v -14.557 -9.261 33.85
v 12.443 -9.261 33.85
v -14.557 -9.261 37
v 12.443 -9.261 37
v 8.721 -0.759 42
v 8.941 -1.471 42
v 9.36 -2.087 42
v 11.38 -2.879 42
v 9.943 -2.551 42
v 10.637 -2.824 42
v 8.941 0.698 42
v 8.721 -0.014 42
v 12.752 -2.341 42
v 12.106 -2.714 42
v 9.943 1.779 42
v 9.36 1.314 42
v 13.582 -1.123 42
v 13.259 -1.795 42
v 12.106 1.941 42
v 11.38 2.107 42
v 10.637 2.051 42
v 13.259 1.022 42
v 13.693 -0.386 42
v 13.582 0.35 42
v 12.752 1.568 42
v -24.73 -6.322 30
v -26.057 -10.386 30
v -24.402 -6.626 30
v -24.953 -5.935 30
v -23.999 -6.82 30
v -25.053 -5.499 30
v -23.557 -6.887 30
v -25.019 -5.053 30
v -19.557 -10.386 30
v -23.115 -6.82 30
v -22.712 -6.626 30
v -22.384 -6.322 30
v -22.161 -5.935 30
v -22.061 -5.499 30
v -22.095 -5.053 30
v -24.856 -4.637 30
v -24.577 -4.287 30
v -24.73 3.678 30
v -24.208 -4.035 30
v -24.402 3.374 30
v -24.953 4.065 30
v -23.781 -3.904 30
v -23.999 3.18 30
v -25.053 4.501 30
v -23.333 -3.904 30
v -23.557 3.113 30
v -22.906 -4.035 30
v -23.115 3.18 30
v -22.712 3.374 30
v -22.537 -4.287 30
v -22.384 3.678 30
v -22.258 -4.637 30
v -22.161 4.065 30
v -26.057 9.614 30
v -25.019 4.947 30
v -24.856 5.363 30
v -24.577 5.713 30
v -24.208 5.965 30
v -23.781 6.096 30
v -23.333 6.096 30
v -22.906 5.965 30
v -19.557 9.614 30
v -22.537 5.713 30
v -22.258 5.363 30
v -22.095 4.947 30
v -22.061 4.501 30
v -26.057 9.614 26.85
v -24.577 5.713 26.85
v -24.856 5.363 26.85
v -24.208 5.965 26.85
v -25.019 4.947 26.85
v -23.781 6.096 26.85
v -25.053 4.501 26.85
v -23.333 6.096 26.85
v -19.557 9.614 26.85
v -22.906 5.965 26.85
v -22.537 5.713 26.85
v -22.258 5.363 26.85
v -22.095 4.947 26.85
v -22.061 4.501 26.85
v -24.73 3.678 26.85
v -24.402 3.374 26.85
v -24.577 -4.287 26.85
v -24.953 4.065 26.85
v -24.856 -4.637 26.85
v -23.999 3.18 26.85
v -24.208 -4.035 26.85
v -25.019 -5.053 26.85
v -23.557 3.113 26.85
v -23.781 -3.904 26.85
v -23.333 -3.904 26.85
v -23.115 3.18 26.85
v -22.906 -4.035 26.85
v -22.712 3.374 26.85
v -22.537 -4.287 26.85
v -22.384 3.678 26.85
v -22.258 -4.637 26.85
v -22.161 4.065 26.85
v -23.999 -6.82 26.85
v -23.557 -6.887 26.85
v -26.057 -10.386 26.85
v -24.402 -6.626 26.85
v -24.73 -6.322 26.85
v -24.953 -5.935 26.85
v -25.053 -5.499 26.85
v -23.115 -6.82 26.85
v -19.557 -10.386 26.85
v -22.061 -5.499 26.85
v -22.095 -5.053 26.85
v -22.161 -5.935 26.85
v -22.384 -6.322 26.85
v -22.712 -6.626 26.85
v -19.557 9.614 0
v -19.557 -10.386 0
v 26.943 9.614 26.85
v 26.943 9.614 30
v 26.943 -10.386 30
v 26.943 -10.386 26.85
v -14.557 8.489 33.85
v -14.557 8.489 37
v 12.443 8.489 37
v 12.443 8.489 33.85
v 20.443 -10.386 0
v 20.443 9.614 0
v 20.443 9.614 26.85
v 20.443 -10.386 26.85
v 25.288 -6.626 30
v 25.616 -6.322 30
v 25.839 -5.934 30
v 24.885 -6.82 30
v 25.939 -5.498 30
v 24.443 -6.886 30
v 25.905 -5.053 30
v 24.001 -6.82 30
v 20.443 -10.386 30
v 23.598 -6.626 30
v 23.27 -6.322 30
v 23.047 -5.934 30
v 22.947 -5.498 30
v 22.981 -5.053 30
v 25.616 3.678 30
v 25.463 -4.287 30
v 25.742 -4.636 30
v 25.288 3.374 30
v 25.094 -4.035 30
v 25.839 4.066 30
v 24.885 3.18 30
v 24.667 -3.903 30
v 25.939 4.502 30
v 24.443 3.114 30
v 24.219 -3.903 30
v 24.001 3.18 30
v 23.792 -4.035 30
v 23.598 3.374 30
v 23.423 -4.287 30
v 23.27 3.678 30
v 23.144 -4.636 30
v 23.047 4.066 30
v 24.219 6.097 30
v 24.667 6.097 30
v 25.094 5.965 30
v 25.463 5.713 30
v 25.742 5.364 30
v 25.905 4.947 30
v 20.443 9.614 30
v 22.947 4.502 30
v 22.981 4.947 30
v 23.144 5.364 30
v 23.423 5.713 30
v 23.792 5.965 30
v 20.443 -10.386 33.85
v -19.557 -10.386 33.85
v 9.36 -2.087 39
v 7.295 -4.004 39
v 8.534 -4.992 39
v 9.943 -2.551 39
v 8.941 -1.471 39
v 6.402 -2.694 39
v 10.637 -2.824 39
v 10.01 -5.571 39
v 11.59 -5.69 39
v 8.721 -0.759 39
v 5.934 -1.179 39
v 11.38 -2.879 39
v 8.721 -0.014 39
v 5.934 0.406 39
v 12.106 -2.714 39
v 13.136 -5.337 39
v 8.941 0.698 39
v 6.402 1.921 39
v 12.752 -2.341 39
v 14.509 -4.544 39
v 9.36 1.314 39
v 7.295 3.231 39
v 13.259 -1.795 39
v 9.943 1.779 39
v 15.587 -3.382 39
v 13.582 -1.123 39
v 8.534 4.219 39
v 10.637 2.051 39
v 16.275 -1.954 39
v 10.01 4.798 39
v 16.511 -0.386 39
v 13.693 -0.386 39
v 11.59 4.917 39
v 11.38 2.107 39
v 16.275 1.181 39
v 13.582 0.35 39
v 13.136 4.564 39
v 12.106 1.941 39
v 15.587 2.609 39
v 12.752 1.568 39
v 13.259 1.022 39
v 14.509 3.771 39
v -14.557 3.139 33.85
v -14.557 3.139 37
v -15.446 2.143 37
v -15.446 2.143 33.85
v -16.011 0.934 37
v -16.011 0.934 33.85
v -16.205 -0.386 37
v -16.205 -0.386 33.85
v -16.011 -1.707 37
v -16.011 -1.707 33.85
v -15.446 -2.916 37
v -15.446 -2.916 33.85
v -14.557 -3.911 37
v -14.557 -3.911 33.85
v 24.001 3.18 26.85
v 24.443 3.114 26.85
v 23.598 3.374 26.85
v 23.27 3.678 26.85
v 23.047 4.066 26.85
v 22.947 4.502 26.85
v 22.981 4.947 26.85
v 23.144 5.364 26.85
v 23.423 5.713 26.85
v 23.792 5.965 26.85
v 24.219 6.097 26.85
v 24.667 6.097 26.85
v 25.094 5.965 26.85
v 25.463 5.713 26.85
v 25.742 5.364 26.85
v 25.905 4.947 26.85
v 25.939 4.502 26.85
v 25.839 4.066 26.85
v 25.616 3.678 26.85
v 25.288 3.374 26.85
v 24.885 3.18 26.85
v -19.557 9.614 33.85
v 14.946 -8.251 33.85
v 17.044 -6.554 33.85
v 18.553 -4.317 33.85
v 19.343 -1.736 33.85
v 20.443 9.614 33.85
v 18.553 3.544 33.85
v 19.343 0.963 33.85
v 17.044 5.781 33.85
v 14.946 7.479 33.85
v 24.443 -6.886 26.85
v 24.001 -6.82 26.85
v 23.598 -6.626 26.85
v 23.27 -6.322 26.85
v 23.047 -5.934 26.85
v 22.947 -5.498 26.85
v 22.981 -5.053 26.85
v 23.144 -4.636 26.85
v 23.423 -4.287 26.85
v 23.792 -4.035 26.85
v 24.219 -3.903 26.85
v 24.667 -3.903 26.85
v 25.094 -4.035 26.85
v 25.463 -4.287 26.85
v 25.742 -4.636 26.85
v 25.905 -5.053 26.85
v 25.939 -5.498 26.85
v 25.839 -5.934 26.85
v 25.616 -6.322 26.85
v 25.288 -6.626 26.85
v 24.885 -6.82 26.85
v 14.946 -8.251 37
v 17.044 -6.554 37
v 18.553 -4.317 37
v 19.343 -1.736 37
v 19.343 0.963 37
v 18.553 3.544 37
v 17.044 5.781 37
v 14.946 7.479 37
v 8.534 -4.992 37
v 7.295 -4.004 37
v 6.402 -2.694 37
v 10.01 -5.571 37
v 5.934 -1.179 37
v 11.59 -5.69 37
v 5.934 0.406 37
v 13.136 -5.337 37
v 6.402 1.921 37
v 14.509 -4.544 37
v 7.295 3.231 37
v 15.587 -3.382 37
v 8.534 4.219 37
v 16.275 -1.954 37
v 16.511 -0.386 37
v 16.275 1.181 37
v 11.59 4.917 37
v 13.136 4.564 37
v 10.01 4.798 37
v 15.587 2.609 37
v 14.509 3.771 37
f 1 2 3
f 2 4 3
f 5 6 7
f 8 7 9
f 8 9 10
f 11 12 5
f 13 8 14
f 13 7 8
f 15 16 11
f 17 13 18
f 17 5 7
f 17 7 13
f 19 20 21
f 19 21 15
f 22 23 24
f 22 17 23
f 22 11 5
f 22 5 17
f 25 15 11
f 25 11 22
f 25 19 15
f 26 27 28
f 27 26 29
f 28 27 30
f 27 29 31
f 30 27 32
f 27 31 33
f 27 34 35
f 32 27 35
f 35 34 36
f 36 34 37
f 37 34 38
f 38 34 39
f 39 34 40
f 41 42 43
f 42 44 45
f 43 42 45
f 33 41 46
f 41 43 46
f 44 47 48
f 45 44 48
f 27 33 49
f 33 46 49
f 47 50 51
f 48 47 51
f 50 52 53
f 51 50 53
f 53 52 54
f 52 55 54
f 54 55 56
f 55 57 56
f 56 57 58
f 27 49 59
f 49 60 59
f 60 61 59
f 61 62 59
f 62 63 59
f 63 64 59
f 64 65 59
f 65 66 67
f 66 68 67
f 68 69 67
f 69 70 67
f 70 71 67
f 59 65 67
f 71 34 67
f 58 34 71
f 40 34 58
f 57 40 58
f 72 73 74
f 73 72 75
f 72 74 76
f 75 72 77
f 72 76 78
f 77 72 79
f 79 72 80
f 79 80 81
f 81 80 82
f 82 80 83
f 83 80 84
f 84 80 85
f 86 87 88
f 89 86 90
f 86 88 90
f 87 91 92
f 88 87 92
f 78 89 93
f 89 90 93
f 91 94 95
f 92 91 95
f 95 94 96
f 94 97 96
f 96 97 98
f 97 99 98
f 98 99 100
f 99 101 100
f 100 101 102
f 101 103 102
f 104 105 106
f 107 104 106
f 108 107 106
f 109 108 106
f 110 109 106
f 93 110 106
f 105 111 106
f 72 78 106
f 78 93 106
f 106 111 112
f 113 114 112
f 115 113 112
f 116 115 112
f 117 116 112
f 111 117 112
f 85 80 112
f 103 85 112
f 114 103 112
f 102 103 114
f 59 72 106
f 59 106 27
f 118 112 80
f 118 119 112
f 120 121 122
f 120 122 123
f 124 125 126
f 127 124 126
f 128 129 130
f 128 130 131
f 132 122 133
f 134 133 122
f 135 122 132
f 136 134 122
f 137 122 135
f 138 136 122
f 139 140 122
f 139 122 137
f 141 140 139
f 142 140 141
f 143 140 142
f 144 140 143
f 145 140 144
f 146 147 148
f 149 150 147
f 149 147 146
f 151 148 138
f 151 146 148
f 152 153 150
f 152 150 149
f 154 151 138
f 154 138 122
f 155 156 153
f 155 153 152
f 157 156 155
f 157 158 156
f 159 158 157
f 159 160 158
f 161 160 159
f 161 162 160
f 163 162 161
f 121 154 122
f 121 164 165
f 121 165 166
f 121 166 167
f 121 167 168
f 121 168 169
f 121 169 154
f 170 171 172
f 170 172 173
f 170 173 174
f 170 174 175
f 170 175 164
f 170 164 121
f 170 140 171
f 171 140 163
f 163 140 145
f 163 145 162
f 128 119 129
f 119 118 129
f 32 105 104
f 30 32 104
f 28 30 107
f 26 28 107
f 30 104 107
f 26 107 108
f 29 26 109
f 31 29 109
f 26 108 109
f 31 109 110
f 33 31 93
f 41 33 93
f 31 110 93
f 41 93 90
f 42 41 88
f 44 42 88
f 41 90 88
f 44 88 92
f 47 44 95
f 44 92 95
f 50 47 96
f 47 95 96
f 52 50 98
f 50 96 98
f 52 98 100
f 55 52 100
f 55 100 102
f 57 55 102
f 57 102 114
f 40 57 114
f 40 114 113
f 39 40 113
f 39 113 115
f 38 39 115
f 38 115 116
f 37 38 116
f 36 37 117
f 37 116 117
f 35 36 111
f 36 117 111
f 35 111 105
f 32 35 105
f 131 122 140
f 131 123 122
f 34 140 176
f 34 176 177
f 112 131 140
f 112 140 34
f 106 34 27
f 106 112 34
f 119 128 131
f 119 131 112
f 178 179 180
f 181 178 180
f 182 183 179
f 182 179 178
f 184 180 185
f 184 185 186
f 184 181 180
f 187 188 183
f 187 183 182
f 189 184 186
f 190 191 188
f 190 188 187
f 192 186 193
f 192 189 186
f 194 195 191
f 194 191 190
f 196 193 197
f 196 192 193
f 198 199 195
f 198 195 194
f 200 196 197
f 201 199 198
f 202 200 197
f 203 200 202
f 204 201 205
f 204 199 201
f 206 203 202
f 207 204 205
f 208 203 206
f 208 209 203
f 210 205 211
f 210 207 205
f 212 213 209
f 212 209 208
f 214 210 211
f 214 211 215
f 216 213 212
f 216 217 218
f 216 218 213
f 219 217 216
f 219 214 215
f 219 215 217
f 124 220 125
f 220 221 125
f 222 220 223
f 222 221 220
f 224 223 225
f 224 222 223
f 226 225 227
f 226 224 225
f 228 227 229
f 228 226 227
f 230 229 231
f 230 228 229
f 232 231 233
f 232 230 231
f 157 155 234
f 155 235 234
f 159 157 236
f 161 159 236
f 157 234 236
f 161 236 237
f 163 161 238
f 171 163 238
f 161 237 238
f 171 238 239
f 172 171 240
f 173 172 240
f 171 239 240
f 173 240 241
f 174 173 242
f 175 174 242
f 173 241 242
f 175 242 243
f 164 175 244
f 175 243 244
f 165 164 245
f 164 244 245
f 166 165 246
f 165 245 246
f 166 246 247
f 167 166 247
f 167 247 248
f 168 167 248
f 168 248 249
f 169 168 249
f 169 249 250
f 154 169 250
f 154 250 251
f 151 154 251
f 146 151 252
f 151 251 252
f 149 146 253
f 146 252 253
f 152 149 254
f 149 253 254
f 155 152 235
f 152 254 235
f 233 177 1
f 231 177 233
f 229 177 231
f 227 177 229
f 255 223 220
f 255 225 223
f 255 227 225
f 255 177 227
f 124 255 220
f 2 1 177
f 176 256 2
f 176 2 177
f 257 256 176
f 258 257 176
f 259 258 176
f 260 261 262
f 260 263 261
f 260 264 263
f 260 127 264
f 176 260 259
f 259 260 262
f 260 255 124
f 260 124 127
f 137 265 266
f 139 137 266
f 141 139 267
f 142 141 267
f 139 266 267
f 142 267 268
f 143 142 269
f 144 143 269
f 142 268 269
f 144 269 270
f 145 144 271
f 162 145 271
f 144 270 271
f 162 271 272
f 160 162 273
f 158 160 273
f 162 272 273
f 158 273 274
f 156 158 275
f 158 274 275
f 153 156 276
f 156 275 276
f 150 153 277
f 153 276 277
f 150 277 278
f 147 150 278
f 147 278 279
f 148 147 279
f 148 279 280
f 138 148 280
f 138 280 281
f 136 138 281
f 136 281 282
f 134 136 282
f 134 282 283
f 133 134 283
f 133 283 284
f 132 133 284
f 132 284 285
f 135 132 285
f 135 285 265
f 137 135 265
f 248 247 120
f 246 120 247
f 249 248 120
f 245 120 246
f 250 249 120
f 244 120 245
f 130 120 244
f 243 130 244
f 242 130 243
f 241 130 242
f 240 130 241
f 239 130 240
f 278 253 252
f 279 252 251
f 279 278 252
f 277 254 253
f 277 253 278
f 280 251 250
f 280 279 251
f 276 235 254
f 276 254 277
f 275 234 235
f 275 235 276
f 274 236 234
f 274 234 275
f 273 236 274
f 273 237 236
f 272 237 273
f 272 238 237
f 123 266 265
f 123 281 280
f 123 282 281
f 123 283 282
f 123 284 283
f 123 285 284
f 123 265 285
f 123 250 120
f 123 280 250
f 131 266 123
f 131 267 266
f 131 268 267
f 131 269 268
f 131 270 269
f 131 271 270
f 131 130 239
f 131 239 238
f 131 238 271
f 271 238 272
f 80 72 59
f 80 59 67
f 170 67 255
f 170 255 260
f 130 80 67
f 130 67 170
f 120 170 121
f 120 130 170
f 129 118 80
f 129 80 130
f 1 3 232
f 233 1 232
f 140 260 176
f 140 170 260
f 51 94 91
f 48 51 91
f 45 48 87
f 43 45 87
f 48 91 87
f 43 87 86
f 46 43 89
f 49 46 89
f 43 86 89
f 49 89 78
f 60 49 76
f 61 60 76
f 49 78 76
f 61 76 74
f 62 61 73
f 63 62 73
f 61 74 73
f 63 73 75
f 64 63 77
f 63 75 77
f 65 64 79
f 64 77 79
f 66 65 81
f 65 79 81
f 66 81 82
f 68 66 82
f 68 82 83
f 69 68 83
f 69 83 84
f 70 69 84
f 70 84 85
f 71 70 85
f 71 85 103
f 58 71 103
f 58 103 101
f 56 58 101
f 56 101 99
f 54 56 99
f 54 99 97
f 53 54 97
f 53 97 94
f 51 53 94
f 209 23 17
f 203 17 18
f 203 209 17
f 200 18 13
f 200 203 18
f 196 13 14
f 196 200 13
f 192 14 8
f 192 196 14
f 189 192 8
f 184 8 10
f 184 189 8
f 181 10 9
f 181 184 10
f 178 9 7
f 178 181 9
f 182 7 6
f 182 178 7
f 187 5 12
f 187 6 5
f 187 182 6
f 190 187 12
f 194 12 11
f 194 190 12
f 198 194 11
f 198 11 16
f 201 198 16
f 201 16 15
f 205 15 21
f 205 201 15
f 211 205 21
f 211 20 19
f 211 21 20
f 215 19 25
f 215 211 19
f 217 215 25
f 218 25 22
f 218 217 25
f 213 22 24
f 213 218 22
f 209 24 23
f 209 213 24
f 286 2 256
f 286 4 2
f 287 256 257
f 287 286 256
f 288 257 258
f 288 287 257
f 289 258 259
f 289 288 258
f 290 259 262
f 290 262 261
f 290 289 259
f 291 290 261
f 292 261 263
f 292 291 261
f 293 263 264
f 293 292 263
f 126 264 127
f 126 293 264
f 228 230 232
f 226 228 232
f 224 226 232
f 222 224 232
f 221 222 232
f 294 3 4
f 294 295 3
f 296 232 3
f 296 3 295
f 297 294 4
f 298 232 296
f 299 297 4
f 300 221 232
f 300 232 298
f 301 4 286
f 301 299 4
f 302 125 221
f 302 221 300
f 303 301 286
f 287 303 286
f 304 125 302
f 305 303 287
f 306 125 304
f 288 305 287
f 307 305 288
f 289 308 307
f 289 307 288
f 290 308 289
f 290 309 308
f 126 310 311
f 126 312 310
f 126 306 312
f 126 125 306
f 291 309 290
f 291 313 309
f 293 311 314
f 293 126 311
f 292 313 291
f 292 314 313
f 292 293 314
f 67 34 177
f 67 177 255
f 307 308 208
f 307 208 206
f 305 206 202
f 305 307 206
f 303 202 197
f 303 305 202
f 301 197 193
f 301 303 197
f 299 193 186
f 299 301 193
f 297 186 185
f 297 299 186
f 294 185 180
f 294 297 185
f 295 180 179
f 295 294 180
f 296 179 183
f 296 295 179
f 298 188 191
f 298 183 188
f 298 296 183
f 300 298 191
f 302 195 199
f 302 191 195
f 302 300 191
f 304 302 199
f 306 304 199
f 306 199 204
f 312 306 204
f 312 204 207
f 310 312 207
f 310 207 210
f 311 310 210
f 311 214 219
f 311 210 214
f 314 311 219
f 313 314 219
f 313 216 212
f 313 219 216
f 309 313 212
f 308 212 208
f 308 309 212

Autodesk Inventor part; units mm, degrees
ref_plane "YZ Plane" through (0, 0, 0) normal (1, 0, 0) x (0, 1, 0)
ref_plane "XZ Plane" through (0, 0, 0) normal (0, 1, 0) x (-1, 0, 0)
ref_plane "XY Plane" through (0, 0, 0) normal (0, 0, 1) x (1, 0, 0)
sketch "Sketch1" plane through (0, 0, 0) normal (0, 0, 1) x (1, 0, 0)
  line L0 (-19.557, 9.6136) -> (20.443, 9.6136)
  line L1 (20.443, 9.6136) -> (20.443, -10.3864)
  line L2 (20.443, -10.3864) -> (-19.557, -10.3864)
  line L3 (-19.557, -10.3864) -> (-19.557, 9.6136)
  point P0 (0, 0)
  dimension "d0" = 40
  dimension "d1" = 20
extrude "Extrusion1" add sketch "Sketch1" along normal blind 37
sketch "Sketch2" plane through (0, 0, 37) normal (0, 0, 1) x (1, 0, 0)
  line L0 (20.443, 9.6136) -> (20.443, -10.3864) projected
  line L1 (-19.557, 9.6136) -> (20.443, 9.6136) projected
  line L2 (-19.557, -10.3864) -> (-19.557, 9.6136) projected
  line L3 (20.443, -10.3864) -> (-19.557, -10.3864) projected
  line L4 (-14.557, 8.4886) -> (12.443, 8.4886)
  line L5 (12.443, -9.2614) -> (-14.557, -9.2614)
  line L6 (-14.557, -9.2614) -> (-14.557, 8.4886)
  arc A0 (12.443, -9.2614) -> (12.443, 8.4886) centre (10.3169, -0.3864) ccw
  arc A1 (-14.557, 3.1386) -> (-14.557, -3.9114) centre (-11.6119, -0.3864) ccw
  point P0 (0, 0)
  dimension "d6" = 5
  dimension "d8" = 27
  dimension "d9" = 27
  dimension "d10" = 5.35
  dimension "d11" = 5.35
extrude "Extrusion2" cut sketch "Sketch2" against normal blind 3.15
sketch "Sketch3" plane through (20.443, -10.3864, 0) normal (1, 0, 0) x (0, 0, -1)
  line L0 (-33.85, 20) -> (-33.85, 0) projected
  line L1 (0, 0) -> (-33.85, 0) projected
  line L2 (0, 20) -> (0, 0) projected
  line L3 (0, 20) -> (-33.85, 20) projected
  point P0 (0, 10.3864)
sketch "Sketch4" plane through (20.443, -10.3864, 0) normal (1, 0, 0) x (0, 0, -1)
  line L0 (-33.85, 20) -> (-33.85, 0) projected
  line L1 (0, 0) -> (-33.85, 0) projected
  line L2 (0, 20) -> (-33.85, 20) projected
  line L3 (-30, 20) -> (-26.85, 20)
  line L4 (-26.85, 20) -> (-26.85, 0)
  line L5 (-26.85, 0) -> (-30, 0)
  line L6 (-30, 0) -> (-30, 20)
  line L7 (-33.85, 0) -> (-33.85, 20) projected
  line L8 (0, 20) -> (-33.85, 20) projected
  line L9 (0, 0) -> (0, 20) projected
  line L10 (0, 0) -> (-33.85, 0) projected
  point P0 (0, 10.3864)
  dimension "d14" = 7
  dimension "d15" = 3.15
extrude "Extrusion3" add sketch "Sketch4" along normal blind 6.5 contours L2 L4 L1 L6
sketch "Sketch5" plane through (-19.557, -10.3864, 0) normal (-1, 0, 0) x (0, 0, 1)
  line L0 (33.85, 0) -> (33.85, 20) projected
  line L1 (0, 20) -> (33.85, 20) projected
  line L2 (0, 0) -> (33.85, 0) projected
  line L3 (26.85, 0) -> (30, 0)
  line L4 (30, 0) -> (30, 20)
  line L5 (30, 20) -> (26.85, 20)
  line L6 (26.85, 20) -> (26.85, 0)
  point P0 (0, 10.3864)
  dimension "d18" = 7
  dimension "d19" = 3.15
extrude "Extrusion4" add sketch "Sketch5" along normal blind 6.5 contours L2 L6 L1 L4
sketch "Sketch6" plane through (0, 0, 37) normal (0, 0, 1) x (1, 0, 0)
  circle A0 centre (11.193, -0.3864) radius 5.318
  line L0 (20.443, 9.6136) -> (20.443, -10.3864) projected
  circle A1 centre (11.193, -0.3864) radius 2.5
  point P0 (0, 0)
  dimension "d22" = 9.25
  dimension "d42" = 10.6361
  dimension "d75" = 5
sketch "Sketch7" plane through (20.443, -10.3864, 30) normal (0, 0, 1) x (1, 0, 0)
  line L0 (6.5, 0) -> (6.5, 20) projected
  line L1 (0, 20) -> (6.5, 20) projected
  circle A0 centre (4, 5) radius 2.5
  circle A1 centre (4, 15) radius 2.5
  line L2 (0, 0) -> (0, 20) projected
  point P0 (-20.443, 10.3864)
  point P1 (5.6248, 3.1)
  point P2 (6.5, 3.3)
  point P3 (6.0702, 6.4015)
  point P4 (6.5, 6.3)
  point P5 (6, 13.5)
  point P6 (6.5, 13.7)
  point P7 (6, 16.5)
  point P8 (6.5, 16.7)
  dimension "d25" = 5
  dimension "d26" = 5
  dimension "d79" = 10
  dimension "d80" = 5
  dimension "d81" = 4
  dimension "d82" = 4
sketch "Sketch8" plane through (-19.557, -10.3864, 30) normal (0, 0, 1) x (1, 0, 0)
  line L0 (-7.5004, 19.9995) -> (-7.5004, -0.0005)
  line L1 (-0.5, -0.0005) -> (-7.5004, -0.0005)
  line L2 (-0.4577, 19.9995) -> (-7.5004, 19.9995)
  circle A0 centre (-4, 14.9995) radius 2.5
  circle A1 centre (-4, 4.9995) radius 2.5
  line L3 (0, 20) -> (0, 0) projected
  point P0 (19.557, 10.3864)
  point P1 (-20.443, 10.3864)
  point P2 (-6, 16.4995)
  point P3 (-7.5004, 16.6995)
  point P4 (-6, 13.4995)
  point P5 (-7.5004, 13.6995)
  point P6 (-6, 6.4995)
  point P7 (-7.5004, 6.2995)
  point P8 (-6, 3.4995)
  point P9 (-7.5004, 3.2995)
  dimension "d35" = 5
  dimension "d36" = 5
  dimension "d37" = 5
  dimension "d38" = 5
  dimension "d83" = 10
  dimension "d84" = 4
  dimension "d85" = 4
extrude "Extrusion7" add sketch "Sketch6" along normal blind 2 contours A0 | A1
hole "Hole1" at (24.443, 4.6136, 30) at (24.443, -5.3864, 30) direction (0, 0, -1) diameter 3 end through all
hole "Hole2" at (-23.557, 4.6131, 30) at (-23.557, -5.3869, 30) direction (0, 0, -1) diameter 3 end through all
extrude "Extrusion14" add sketch "Sketch6" along normal blind 5 contours A1
properties part number "servo HS-7955GT"
